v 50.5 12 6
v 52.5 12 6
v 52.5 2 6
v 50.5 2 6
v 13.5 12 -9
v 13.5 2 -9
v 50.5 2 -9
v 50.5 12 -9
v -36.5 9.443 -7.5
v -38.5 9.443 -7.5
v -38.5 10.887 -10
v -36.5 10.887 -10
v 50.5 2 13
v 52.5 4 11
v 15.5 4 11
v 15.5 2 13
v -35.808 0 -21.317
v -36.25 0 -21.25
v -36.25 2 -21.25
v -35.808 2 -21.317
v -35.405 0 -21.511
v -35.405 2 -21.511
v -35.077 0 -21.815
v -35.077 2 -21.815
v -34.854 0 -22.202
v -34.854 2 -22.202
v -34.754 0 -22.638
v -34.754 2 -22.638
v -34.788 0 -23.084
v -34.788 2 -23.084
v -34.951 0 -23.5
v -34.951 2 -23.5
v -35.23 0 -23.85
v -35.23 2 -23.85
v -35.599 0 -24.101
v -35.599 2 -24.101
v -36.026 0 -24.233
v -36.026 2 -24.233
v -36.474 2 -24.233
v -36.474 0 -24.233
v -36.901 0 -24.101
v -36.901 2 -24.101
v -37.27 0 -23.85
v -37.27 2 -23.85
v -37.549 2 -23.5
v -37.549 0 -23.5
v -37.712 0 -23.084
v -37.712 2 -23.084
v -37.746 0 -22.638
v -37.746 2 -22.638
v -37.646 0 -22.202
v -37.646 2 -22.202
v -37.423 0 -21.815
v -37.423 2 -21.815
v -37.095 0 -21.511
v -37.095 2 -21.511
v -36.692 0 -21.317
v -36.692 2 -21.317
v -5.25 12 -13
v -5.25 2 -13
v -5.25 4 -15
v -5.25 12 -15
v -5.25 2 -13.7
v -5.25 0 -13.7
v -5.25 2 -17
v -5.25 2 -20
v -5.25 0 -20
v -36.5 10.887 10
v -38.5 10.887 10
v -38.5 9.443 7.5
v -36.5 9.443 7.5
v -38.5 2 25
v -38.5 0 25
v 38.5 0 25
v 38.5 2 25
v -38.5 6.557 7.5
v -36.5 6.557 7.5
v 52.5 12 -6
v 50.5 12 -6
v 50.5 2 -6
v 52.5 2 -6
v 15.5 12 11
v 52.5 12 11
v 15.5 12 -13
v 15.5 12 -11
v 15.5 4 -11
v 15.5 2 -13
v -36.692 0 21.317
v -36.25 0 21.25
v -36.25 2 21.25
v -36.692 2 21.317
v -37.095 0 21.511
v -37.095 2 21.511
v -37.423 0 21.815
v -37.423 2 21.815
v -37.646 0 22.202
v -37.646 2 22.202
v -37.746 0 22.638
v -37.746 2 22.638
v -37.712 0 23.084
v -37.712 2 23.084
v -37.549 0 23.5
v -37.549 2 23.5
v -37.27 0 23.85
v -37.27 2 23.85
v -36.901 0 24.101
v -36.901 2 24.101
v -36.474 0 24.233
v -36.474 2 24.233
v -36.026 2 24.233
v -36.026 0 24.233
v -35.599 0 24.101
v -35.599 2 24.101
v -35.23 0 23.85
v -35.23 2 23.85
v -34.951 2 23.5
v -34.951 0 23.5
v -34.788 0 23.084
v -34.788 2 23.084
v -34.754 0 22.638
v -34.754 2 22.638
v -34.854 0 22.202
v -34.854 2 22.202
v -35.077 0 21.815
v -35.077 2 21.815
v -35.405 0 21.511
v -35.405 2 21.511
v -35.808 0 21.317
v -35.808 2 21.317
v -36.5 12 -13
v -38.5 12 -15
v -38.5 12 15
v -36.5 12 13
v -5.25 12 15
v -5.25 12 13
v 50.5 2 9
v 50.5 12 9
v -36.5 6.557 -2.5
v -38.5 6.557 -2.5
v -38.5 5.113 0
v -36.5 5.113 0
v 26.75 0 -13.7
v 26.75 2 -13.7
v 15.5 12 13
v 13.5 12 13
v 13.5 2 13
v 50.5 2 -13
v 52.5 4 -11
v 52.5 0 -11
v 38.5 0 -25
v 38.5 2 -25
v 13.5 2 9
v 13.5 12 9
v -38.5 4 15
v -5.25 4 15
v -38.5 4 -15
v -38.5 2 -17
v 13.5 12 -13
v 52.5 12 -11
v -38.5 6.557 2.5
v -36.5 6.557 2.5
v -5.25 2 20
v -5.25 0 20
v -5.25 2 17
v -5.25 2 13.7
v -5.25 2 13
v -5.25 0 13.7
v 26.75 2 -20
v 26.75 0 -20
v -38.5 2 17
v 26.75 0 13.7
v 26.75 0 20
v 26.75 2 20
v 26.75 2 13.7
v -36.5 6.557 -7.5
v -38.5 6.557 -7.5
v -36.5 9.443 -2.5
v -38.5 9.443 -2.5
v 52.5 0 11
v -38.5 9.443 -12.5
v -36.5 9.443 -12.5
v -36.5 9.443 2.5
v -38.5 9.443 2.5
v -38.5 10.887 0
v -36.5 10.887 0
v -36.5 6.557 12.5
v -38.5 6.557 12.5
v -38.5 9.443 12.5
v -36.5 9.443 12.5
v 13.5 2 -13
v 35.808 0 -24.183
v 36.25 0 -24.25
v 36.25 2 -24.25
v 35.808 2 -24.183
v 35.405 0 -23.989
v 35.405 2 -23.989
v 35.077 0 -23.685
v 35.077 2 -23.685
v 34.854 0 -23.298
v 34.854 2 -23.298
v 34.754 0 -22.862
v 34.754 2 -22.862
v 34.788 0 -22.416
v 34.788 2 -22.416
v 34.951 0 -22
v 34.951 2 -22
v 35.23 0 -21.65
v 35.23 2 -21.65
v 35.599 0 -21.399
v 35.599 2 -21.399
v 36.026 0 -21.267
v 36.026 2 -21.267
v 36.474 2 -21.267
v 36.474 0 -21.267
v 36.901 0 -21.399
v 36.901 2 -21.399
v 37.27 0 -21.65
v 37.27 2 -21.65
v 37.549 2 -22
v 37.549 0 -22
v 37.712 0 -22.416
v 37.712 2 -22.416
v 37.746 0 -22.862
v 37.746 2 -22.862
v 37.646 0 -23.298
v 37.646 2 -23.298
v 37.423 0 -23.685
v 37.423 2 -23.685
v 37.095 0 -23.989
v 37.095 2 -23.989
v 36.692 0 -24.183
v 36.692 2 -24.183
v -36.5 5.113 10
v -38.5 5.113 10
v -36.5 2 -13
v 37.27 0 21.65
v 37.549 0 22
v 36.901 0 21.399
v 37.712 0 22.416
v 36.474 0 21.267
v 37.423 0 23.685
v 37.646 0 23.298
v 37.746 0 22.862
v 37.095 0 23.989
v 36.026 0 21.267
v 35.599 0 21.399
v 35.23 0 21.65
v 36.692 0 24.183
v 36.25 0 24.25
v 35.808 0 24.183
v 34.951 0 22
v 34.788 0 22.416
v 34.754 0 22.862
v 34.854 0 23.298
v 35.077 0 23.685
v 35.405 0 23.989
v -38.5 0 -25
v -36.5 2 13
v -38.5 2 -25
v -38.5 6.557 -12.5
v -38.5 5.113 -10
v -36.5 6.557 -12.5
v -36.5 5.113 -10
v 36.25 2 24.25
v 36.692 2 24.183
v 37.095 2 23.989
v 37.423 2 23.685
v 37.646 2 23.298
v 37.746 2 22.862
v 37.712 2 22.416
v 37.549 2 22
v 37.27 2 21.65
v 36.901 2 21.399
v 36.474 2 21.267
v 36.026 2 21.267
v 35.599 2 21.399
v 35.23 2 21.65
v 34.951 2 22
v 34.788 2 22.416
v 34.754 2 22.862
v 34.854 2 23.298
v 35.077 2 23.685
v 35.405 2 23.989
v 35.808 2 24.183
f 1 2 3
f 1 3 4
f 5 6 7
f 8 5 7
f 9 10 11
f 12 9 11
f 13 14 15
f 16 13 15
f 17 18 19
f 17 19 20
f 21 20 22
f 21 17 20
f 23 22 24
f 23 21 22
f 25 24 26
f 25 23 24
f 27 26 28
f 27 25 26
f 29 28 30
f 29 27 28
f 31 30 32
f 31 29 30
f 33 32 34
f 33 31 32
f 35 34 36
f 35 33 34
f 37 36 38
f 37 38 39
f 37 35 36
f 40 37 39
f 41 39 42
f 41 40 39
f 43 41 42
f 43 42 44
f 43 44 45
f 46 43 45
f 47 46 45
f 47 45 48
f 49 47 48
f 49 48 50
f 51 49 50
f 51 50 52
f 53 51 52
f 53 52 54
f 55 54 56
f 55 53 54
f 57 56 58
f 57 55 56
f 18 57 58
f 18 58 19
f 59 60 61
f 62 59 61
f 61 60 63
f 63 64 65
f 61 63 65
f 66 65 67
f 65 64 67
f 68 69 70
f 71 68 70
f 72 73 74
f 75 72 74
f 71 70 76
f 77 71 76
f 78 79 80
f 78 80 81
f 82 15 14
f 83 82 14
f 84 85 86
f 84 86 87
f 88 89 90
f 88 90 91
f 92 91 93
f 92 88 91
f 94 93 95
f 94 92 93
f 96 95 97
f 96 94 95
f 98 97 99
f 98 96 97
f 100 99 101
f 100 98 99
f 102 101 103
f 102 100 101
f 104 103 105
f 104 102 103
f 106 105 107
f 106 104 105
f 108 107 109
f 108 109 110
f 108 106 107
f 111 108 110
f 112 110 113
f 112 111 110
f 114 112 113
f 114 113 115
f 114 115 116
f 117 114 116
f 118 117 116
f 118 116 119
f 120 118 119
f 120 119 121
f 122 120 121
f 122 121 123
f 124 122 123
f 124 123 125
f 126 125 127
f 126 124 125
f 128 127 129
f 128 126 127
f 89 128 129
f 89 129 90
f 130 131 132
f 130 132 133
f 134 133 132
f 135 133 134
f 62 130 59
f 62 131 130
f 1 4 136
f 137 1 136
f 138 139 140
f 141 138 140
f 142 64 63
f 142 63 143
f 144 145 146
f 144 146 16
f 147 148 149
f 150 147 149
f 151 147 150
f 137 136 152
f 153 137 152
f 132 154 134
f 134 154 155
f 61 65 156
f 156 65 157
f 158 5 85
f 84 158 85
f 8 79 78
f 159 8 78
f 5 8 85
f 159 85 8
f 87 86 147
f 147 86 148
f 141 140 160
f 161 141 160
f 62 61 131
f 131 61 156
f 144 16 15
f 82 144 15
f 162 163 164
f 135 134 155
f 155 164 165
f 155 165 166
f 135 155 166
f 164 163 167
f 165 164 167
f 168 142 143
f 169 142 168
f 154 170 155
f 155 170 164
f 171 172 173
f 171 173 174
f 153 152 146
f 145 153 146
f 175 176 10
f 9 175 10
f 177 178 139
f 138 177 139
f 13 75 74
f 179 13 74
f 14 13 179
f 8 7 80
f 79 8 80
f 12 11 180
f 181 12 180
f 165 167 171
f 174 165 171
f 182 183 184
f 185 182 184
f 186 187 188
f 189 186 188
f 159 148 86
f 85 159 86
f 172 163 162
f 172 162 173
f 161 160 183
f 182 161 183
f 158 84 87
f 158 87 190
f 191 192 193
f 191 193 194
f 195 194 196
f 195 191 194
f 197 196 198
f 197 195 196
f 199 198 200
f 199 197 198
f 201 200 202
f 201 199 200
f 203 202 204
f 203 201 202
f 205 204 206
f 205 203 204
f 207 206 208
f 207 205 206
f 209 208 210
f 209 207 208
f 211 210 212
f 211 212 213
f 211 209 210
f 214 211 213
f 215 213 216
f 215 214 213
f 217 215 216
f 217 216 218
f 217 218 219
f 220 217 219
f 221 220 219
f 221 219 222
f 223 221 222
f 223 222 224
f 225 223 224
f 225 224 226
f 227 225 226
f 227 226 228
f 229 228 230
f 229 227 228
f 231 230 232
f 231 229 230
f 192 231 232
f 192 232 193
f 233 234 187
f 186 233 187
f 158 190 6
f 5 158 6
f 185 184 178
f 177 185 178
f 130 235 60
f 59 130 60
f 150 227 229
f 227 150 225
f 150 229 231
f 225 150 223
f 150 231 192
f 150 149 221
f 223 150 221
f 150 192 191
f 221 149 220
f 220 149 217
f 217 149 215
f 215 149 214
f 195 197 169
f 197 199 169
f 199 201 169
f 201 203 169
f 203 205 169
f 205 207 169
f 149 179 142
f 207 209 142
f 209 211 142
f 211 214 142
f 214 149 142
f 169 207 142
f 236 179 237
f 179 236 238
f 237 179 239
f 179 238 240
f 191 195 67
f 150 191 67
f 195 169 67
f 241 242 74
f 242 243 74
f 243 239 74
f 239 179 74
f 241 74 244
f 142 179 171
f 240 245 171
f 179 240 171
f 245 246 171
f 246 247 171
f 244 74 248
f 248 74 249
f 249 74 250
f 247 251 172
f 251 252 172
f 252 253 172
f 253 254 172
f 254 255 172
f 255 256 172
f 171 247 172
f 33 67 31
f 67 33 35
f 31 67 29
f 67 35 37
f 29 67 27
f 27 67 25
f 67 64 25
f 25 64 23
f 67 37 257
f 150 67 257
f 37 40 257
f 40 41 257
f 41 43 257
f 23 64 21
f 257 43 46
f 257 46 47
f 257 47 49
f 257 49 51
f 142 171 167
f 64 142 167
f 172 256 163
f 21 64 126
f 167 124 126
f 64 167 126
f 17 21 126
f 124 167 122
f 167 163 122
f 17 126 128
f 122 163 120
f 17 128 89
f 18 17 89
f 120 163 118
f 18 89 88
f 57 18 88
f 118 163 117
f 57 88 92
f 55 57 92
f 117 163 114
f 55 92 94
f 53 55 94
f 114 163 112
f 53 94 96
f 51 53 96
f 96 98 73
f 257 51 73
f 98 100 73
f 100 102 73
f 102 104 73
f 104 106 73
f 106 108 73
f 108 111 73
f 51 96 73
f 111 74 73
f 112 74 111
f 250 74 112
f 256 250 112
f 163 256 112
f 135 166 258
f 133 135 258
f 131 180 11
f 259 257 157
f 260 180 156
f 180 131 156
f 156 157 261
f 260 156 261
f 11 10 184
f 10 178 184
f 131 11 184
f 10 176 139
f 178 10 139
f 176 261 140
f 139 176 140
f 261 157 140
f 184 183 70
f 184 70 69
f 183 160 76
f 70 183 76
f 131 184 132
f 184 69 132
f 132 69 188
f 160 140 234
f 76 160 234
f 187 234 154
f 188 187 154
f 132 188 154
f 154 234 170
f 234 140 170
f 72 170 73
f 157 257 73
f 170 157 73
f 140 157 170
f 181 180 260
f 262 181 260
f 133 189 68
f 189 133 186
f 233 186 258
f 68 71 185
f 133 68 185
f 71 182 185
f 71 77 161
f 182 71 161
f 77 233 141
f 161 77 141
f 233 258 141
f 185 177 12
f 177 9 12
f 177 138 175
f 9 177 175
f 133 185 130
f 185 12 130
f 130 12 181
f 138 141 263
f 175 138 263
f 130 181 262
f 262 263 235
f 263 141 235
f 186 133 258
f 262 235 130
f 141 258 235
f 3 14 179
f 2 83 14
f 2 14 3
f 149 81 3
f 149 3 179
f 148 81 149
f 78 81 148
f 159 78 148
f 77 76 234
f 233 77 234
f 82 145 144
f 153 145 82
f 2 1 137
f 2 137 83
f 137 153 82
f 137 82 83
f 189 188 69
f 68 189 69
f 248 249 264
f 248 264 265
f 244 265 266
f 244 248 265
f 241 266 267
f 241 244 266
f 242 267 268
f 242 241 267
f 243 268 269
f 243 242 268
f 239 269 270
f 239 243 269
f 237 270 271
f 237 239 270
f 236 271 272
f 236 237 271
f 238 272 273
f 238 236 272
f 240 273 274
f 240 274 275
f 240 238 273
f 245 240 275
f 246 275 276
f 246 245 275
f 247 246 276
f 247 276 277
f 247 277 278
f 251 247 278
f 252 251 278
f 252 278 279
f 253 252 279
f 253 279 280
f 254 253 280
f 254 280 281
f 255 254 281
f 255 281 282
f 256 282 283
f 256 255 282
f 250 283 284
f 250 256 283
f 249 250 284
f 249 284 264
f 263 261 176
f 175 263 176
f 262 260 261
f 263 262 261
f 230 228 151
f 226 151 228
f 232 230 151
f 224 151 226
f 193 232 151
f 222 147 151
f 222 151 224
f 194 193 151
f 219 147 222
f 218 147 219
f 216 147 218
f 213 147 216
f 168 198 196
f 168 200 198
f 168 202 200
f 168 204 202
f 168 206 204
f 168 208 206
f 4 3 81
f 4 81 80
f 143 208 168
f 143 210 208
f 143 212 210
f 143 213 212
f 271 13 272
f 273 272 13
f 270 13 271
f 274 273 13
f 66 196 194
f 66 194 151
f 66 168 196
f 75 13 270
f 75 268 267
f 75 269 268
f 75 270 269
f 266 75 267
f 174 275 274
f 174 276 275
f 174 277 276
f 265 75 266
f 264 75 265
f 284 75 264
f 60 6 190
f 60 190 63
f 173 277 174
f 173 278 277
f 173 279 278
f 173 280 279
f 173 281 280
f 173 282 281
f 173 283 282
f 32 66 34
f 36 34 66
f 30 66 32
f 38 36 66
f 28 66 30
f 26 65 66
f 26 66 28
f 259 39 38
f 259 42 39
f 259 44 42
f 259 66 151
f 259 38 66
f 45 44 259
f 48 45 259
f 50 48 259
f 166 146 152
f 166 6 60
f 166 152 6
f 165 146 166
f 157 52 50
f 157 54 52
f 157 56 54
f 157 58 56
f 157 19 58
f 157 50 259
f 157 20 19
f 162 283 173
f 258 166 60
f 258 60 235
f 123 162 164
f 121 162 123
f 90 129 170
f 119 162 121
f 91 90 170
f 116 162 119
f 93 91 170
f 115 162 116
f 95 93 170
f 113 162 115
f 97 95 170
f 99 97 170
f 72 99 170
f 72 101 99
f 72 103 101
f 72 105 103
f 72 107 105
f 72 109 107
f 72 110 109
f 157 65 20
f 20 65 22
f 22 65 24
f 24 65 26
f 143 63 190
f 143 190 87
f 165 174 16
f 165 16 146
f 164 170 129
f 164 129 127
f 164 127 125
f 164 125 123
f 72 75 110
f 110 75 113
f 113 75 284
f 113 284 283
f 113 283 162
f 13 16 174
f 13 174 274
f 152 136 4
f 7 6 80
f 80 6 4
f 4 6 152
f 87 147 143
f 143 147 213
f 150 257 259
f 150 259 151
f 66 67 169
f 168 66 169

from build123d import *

# Parameters (mm, degrees)
SKETCH1_W           = 77
SKETCH1_H           = 50
SKETCH1_R           = 1.5
SKETCH1_W_2         = 32
SKETCH1_H_2         = 6.3
BOSS_EXTRUDE1_DEPTH = 2
BOSS_EXTRUDE2_DEPTH = 10
BOSS_EXTRUDE3_DEPTH = 2
CHAMFER1_SIZE       = 2
CUT_EXTRUDE1_REACH  = 97.131


with BuildPart() as part:
    # Sketch1 → Boss-Extrude1 (new body)
    with BuildSketch(Plane(origin=(0, 0, 0), x_dir=(1, 0, 0), z_dir=(0, 1, 0))):
        Rectangle(SKETCH1_W, SKETCH1_H)
        with Locations(Location((-36.25, 22.75, 0), (0, 0, 270))):
            Circle(SKETCH1_R, mode=Mode.SUBTRACT)
        with Locations(Location((36.25, 22.75, 0), (0, 0, 90))):
            Circle(SKETCH1_R, mode=Mode.SUBTRACT)
        with Locations(Location((36.25, -22.75, 0), (0, 0, 270))):
            Circle(SKETCH1_R, mode=Mode.SUBTRACT)
        with Locations(Location((-36.25, -22.75, 0), (0, 0, 90))):
            Circle(SKETCH1_R, mode=Mode.SUBTRACT)
        with Locations((10.75, 16.85)):
            Rectangle(SKETCH1_W_2, SKETCH1_H_2, mode=Mode.SUBTRACT)
        with Locations((10.75, -16.85)):
            Rectangle(SKETCH1_W_2, SKETCH1_H_2, mode=Mode.SUBTRACT)
    extrude(amount=BOSS_EXTRUDE1_DEPTH)

    # Sketch2 → Boss-Extrude2 (add)
    with BuildSketch(Plane(origin=(0, 2, 0), x_dir=(1, 0, 0), z_dir=(0, 1, 0))):
        Polygon((-38.5, 15), (-38.5, -15), (-5.25, -15), (-5.25, -13.7), (-5.25, -13), (-36.5, -13), (-36.5, 13), (-5.25, 13), (-5.25, 13.7), (-5.25, 15), align=None)
        Polygon((15.5, 13), (13.5, 13), (13.5, 9), (38.5, 9), (38.5, 11), (15.5, 11), align=None)
        Polygon((38.5, 11), (38.5, 9), (50.5, 9), (50.5, 6), (52.5, 6), (52.5, 11), align=None)
        Polygon((50.5, -9), (38.5, -9), (38.5, -11), (52.5, -11), (52.5, -6), (50.5, -6), align=None)
        Polygon((13.5, -9), (13.5, -13), (15.5, -13), (15.5, -11), (38.5, -11), (38.5, -9), align=None)
    extrude(amount=BOSS_EXTRUDE2_DEPTH)

    # Sketch3 → Boss-Extrude3 (add)
    with BuildSketch(Plane.XZ.offset(-2)):
        Polygon((38.5, 25), (52.5, 11), (52.5, -11), (38.5, -25), align=None)
    extrude(amount=BOSS_EXTRUDE3_DEPTH)

    # Chamfer1
    chamfer1_edges = [part.edges().sort_by_distance(p)[0] for p in [
        (-21.875, 2, -15),
        (34, 2, -11),
        (34, 2, 11),
        (-21.875, 2, 15),
    ]]
    chamfer(chamfer1_edges, length=CHAMFER1_SIZE)

    # Sketch4 → Cut-Extrude1 (cut, up to next)
    with BuildSketch(Plane.ZY.offset(38.5), mode=Mode.PRIVATE) as cut_extrude1_sk1:
        Polygon((-7.5, 6.556624327), (-7.5, 9.443375673), (-10, 10.886751346), (-12.5, 9.443375673), (-12.5, 6.556624327), (-10, 5.113248654), align=None)
    cut_extrude1_tool1 = extrude(cut_extrude1_sk1.sketch, amount=-CUT_EXTRUDE1_REACH, mode=Mode.PRIVATE) & part.part
    # Sketch4 → Cut-Extrude1 (cut, up to next)
    with BuildSketch(Plane.ZY.offset(38.5), mode=Mode.PRIVATE) as cut_extrude1_sk2:
        Polygon((0, 10.886751346), (0, 5.113248654), (2.5, 6.556624327), (2.5, 9.443375673), align=None)
    cut_extrude1_tool2 = extrude(cut_extrude1_sk2.sketch, amount=-CUT_EXTRUDE1_REACH, mode=Mode.PRIVATE) & part.part
    # Sketch4 → Cut-Extrude1 (cut, up to next)
    with BuildSketch(Plane.ZY.offset(38.5), mode=Mode.PRIVATE) as cut_extrude1_sk3:
        Polygon((-2.5, 6.556624327), (0, 5.113248654), (0, 10.886751346), (-2.5, 9.443375673), align=None)
    cut_extrude1_tool3 = extrude(cut_extrude1_sk3.sketch, amount=-CUT_EXTRUDE1_REACH, mode=Mode.PRIVATE) & part.part
    # Sketch4 → Cut-Extrude1 (cut, up to next)
    with BuildSketch(Plane.ZY.offset(38.5), mode=Mode.PRIVATE) as cut_extrude1_sk4:
        Polygon((12.5, 6.556624327), (12.5, 9.443375673), (10, 10.886751346), (7.5, 9.443375673), (7.5, 6.556624327), (10, 5.113248654), align=None)
    cut_extrude1_tool4 = extrude(cut_extrude1_sk4.sketch, amount=-CUT_EXTRUDE1_REACH, mode=Mode.PRIVATE) & part.part
    add(cut_extrude1_tool1.solids().sort_by_distance((-38.5, 8, -10))[0], mode=Mode.SUBTRACT)
    add(cut_extrude1_tool2.solids().sort_by_distance((-38.5, 8, 1.111111))[0], mode=Mode.SUBTRACT)
    add(cut_extrude1_tool3.solids().sort_by_distance((-38.5, 8, -1.111111))[0], mode=Mode.SUBTRACT)
    add(cut_extrude1_tool4.solids().sort_by_distance((-38.5, 8, 10))[0], mode=Mode.SUBTRACT)


solid = part.part
